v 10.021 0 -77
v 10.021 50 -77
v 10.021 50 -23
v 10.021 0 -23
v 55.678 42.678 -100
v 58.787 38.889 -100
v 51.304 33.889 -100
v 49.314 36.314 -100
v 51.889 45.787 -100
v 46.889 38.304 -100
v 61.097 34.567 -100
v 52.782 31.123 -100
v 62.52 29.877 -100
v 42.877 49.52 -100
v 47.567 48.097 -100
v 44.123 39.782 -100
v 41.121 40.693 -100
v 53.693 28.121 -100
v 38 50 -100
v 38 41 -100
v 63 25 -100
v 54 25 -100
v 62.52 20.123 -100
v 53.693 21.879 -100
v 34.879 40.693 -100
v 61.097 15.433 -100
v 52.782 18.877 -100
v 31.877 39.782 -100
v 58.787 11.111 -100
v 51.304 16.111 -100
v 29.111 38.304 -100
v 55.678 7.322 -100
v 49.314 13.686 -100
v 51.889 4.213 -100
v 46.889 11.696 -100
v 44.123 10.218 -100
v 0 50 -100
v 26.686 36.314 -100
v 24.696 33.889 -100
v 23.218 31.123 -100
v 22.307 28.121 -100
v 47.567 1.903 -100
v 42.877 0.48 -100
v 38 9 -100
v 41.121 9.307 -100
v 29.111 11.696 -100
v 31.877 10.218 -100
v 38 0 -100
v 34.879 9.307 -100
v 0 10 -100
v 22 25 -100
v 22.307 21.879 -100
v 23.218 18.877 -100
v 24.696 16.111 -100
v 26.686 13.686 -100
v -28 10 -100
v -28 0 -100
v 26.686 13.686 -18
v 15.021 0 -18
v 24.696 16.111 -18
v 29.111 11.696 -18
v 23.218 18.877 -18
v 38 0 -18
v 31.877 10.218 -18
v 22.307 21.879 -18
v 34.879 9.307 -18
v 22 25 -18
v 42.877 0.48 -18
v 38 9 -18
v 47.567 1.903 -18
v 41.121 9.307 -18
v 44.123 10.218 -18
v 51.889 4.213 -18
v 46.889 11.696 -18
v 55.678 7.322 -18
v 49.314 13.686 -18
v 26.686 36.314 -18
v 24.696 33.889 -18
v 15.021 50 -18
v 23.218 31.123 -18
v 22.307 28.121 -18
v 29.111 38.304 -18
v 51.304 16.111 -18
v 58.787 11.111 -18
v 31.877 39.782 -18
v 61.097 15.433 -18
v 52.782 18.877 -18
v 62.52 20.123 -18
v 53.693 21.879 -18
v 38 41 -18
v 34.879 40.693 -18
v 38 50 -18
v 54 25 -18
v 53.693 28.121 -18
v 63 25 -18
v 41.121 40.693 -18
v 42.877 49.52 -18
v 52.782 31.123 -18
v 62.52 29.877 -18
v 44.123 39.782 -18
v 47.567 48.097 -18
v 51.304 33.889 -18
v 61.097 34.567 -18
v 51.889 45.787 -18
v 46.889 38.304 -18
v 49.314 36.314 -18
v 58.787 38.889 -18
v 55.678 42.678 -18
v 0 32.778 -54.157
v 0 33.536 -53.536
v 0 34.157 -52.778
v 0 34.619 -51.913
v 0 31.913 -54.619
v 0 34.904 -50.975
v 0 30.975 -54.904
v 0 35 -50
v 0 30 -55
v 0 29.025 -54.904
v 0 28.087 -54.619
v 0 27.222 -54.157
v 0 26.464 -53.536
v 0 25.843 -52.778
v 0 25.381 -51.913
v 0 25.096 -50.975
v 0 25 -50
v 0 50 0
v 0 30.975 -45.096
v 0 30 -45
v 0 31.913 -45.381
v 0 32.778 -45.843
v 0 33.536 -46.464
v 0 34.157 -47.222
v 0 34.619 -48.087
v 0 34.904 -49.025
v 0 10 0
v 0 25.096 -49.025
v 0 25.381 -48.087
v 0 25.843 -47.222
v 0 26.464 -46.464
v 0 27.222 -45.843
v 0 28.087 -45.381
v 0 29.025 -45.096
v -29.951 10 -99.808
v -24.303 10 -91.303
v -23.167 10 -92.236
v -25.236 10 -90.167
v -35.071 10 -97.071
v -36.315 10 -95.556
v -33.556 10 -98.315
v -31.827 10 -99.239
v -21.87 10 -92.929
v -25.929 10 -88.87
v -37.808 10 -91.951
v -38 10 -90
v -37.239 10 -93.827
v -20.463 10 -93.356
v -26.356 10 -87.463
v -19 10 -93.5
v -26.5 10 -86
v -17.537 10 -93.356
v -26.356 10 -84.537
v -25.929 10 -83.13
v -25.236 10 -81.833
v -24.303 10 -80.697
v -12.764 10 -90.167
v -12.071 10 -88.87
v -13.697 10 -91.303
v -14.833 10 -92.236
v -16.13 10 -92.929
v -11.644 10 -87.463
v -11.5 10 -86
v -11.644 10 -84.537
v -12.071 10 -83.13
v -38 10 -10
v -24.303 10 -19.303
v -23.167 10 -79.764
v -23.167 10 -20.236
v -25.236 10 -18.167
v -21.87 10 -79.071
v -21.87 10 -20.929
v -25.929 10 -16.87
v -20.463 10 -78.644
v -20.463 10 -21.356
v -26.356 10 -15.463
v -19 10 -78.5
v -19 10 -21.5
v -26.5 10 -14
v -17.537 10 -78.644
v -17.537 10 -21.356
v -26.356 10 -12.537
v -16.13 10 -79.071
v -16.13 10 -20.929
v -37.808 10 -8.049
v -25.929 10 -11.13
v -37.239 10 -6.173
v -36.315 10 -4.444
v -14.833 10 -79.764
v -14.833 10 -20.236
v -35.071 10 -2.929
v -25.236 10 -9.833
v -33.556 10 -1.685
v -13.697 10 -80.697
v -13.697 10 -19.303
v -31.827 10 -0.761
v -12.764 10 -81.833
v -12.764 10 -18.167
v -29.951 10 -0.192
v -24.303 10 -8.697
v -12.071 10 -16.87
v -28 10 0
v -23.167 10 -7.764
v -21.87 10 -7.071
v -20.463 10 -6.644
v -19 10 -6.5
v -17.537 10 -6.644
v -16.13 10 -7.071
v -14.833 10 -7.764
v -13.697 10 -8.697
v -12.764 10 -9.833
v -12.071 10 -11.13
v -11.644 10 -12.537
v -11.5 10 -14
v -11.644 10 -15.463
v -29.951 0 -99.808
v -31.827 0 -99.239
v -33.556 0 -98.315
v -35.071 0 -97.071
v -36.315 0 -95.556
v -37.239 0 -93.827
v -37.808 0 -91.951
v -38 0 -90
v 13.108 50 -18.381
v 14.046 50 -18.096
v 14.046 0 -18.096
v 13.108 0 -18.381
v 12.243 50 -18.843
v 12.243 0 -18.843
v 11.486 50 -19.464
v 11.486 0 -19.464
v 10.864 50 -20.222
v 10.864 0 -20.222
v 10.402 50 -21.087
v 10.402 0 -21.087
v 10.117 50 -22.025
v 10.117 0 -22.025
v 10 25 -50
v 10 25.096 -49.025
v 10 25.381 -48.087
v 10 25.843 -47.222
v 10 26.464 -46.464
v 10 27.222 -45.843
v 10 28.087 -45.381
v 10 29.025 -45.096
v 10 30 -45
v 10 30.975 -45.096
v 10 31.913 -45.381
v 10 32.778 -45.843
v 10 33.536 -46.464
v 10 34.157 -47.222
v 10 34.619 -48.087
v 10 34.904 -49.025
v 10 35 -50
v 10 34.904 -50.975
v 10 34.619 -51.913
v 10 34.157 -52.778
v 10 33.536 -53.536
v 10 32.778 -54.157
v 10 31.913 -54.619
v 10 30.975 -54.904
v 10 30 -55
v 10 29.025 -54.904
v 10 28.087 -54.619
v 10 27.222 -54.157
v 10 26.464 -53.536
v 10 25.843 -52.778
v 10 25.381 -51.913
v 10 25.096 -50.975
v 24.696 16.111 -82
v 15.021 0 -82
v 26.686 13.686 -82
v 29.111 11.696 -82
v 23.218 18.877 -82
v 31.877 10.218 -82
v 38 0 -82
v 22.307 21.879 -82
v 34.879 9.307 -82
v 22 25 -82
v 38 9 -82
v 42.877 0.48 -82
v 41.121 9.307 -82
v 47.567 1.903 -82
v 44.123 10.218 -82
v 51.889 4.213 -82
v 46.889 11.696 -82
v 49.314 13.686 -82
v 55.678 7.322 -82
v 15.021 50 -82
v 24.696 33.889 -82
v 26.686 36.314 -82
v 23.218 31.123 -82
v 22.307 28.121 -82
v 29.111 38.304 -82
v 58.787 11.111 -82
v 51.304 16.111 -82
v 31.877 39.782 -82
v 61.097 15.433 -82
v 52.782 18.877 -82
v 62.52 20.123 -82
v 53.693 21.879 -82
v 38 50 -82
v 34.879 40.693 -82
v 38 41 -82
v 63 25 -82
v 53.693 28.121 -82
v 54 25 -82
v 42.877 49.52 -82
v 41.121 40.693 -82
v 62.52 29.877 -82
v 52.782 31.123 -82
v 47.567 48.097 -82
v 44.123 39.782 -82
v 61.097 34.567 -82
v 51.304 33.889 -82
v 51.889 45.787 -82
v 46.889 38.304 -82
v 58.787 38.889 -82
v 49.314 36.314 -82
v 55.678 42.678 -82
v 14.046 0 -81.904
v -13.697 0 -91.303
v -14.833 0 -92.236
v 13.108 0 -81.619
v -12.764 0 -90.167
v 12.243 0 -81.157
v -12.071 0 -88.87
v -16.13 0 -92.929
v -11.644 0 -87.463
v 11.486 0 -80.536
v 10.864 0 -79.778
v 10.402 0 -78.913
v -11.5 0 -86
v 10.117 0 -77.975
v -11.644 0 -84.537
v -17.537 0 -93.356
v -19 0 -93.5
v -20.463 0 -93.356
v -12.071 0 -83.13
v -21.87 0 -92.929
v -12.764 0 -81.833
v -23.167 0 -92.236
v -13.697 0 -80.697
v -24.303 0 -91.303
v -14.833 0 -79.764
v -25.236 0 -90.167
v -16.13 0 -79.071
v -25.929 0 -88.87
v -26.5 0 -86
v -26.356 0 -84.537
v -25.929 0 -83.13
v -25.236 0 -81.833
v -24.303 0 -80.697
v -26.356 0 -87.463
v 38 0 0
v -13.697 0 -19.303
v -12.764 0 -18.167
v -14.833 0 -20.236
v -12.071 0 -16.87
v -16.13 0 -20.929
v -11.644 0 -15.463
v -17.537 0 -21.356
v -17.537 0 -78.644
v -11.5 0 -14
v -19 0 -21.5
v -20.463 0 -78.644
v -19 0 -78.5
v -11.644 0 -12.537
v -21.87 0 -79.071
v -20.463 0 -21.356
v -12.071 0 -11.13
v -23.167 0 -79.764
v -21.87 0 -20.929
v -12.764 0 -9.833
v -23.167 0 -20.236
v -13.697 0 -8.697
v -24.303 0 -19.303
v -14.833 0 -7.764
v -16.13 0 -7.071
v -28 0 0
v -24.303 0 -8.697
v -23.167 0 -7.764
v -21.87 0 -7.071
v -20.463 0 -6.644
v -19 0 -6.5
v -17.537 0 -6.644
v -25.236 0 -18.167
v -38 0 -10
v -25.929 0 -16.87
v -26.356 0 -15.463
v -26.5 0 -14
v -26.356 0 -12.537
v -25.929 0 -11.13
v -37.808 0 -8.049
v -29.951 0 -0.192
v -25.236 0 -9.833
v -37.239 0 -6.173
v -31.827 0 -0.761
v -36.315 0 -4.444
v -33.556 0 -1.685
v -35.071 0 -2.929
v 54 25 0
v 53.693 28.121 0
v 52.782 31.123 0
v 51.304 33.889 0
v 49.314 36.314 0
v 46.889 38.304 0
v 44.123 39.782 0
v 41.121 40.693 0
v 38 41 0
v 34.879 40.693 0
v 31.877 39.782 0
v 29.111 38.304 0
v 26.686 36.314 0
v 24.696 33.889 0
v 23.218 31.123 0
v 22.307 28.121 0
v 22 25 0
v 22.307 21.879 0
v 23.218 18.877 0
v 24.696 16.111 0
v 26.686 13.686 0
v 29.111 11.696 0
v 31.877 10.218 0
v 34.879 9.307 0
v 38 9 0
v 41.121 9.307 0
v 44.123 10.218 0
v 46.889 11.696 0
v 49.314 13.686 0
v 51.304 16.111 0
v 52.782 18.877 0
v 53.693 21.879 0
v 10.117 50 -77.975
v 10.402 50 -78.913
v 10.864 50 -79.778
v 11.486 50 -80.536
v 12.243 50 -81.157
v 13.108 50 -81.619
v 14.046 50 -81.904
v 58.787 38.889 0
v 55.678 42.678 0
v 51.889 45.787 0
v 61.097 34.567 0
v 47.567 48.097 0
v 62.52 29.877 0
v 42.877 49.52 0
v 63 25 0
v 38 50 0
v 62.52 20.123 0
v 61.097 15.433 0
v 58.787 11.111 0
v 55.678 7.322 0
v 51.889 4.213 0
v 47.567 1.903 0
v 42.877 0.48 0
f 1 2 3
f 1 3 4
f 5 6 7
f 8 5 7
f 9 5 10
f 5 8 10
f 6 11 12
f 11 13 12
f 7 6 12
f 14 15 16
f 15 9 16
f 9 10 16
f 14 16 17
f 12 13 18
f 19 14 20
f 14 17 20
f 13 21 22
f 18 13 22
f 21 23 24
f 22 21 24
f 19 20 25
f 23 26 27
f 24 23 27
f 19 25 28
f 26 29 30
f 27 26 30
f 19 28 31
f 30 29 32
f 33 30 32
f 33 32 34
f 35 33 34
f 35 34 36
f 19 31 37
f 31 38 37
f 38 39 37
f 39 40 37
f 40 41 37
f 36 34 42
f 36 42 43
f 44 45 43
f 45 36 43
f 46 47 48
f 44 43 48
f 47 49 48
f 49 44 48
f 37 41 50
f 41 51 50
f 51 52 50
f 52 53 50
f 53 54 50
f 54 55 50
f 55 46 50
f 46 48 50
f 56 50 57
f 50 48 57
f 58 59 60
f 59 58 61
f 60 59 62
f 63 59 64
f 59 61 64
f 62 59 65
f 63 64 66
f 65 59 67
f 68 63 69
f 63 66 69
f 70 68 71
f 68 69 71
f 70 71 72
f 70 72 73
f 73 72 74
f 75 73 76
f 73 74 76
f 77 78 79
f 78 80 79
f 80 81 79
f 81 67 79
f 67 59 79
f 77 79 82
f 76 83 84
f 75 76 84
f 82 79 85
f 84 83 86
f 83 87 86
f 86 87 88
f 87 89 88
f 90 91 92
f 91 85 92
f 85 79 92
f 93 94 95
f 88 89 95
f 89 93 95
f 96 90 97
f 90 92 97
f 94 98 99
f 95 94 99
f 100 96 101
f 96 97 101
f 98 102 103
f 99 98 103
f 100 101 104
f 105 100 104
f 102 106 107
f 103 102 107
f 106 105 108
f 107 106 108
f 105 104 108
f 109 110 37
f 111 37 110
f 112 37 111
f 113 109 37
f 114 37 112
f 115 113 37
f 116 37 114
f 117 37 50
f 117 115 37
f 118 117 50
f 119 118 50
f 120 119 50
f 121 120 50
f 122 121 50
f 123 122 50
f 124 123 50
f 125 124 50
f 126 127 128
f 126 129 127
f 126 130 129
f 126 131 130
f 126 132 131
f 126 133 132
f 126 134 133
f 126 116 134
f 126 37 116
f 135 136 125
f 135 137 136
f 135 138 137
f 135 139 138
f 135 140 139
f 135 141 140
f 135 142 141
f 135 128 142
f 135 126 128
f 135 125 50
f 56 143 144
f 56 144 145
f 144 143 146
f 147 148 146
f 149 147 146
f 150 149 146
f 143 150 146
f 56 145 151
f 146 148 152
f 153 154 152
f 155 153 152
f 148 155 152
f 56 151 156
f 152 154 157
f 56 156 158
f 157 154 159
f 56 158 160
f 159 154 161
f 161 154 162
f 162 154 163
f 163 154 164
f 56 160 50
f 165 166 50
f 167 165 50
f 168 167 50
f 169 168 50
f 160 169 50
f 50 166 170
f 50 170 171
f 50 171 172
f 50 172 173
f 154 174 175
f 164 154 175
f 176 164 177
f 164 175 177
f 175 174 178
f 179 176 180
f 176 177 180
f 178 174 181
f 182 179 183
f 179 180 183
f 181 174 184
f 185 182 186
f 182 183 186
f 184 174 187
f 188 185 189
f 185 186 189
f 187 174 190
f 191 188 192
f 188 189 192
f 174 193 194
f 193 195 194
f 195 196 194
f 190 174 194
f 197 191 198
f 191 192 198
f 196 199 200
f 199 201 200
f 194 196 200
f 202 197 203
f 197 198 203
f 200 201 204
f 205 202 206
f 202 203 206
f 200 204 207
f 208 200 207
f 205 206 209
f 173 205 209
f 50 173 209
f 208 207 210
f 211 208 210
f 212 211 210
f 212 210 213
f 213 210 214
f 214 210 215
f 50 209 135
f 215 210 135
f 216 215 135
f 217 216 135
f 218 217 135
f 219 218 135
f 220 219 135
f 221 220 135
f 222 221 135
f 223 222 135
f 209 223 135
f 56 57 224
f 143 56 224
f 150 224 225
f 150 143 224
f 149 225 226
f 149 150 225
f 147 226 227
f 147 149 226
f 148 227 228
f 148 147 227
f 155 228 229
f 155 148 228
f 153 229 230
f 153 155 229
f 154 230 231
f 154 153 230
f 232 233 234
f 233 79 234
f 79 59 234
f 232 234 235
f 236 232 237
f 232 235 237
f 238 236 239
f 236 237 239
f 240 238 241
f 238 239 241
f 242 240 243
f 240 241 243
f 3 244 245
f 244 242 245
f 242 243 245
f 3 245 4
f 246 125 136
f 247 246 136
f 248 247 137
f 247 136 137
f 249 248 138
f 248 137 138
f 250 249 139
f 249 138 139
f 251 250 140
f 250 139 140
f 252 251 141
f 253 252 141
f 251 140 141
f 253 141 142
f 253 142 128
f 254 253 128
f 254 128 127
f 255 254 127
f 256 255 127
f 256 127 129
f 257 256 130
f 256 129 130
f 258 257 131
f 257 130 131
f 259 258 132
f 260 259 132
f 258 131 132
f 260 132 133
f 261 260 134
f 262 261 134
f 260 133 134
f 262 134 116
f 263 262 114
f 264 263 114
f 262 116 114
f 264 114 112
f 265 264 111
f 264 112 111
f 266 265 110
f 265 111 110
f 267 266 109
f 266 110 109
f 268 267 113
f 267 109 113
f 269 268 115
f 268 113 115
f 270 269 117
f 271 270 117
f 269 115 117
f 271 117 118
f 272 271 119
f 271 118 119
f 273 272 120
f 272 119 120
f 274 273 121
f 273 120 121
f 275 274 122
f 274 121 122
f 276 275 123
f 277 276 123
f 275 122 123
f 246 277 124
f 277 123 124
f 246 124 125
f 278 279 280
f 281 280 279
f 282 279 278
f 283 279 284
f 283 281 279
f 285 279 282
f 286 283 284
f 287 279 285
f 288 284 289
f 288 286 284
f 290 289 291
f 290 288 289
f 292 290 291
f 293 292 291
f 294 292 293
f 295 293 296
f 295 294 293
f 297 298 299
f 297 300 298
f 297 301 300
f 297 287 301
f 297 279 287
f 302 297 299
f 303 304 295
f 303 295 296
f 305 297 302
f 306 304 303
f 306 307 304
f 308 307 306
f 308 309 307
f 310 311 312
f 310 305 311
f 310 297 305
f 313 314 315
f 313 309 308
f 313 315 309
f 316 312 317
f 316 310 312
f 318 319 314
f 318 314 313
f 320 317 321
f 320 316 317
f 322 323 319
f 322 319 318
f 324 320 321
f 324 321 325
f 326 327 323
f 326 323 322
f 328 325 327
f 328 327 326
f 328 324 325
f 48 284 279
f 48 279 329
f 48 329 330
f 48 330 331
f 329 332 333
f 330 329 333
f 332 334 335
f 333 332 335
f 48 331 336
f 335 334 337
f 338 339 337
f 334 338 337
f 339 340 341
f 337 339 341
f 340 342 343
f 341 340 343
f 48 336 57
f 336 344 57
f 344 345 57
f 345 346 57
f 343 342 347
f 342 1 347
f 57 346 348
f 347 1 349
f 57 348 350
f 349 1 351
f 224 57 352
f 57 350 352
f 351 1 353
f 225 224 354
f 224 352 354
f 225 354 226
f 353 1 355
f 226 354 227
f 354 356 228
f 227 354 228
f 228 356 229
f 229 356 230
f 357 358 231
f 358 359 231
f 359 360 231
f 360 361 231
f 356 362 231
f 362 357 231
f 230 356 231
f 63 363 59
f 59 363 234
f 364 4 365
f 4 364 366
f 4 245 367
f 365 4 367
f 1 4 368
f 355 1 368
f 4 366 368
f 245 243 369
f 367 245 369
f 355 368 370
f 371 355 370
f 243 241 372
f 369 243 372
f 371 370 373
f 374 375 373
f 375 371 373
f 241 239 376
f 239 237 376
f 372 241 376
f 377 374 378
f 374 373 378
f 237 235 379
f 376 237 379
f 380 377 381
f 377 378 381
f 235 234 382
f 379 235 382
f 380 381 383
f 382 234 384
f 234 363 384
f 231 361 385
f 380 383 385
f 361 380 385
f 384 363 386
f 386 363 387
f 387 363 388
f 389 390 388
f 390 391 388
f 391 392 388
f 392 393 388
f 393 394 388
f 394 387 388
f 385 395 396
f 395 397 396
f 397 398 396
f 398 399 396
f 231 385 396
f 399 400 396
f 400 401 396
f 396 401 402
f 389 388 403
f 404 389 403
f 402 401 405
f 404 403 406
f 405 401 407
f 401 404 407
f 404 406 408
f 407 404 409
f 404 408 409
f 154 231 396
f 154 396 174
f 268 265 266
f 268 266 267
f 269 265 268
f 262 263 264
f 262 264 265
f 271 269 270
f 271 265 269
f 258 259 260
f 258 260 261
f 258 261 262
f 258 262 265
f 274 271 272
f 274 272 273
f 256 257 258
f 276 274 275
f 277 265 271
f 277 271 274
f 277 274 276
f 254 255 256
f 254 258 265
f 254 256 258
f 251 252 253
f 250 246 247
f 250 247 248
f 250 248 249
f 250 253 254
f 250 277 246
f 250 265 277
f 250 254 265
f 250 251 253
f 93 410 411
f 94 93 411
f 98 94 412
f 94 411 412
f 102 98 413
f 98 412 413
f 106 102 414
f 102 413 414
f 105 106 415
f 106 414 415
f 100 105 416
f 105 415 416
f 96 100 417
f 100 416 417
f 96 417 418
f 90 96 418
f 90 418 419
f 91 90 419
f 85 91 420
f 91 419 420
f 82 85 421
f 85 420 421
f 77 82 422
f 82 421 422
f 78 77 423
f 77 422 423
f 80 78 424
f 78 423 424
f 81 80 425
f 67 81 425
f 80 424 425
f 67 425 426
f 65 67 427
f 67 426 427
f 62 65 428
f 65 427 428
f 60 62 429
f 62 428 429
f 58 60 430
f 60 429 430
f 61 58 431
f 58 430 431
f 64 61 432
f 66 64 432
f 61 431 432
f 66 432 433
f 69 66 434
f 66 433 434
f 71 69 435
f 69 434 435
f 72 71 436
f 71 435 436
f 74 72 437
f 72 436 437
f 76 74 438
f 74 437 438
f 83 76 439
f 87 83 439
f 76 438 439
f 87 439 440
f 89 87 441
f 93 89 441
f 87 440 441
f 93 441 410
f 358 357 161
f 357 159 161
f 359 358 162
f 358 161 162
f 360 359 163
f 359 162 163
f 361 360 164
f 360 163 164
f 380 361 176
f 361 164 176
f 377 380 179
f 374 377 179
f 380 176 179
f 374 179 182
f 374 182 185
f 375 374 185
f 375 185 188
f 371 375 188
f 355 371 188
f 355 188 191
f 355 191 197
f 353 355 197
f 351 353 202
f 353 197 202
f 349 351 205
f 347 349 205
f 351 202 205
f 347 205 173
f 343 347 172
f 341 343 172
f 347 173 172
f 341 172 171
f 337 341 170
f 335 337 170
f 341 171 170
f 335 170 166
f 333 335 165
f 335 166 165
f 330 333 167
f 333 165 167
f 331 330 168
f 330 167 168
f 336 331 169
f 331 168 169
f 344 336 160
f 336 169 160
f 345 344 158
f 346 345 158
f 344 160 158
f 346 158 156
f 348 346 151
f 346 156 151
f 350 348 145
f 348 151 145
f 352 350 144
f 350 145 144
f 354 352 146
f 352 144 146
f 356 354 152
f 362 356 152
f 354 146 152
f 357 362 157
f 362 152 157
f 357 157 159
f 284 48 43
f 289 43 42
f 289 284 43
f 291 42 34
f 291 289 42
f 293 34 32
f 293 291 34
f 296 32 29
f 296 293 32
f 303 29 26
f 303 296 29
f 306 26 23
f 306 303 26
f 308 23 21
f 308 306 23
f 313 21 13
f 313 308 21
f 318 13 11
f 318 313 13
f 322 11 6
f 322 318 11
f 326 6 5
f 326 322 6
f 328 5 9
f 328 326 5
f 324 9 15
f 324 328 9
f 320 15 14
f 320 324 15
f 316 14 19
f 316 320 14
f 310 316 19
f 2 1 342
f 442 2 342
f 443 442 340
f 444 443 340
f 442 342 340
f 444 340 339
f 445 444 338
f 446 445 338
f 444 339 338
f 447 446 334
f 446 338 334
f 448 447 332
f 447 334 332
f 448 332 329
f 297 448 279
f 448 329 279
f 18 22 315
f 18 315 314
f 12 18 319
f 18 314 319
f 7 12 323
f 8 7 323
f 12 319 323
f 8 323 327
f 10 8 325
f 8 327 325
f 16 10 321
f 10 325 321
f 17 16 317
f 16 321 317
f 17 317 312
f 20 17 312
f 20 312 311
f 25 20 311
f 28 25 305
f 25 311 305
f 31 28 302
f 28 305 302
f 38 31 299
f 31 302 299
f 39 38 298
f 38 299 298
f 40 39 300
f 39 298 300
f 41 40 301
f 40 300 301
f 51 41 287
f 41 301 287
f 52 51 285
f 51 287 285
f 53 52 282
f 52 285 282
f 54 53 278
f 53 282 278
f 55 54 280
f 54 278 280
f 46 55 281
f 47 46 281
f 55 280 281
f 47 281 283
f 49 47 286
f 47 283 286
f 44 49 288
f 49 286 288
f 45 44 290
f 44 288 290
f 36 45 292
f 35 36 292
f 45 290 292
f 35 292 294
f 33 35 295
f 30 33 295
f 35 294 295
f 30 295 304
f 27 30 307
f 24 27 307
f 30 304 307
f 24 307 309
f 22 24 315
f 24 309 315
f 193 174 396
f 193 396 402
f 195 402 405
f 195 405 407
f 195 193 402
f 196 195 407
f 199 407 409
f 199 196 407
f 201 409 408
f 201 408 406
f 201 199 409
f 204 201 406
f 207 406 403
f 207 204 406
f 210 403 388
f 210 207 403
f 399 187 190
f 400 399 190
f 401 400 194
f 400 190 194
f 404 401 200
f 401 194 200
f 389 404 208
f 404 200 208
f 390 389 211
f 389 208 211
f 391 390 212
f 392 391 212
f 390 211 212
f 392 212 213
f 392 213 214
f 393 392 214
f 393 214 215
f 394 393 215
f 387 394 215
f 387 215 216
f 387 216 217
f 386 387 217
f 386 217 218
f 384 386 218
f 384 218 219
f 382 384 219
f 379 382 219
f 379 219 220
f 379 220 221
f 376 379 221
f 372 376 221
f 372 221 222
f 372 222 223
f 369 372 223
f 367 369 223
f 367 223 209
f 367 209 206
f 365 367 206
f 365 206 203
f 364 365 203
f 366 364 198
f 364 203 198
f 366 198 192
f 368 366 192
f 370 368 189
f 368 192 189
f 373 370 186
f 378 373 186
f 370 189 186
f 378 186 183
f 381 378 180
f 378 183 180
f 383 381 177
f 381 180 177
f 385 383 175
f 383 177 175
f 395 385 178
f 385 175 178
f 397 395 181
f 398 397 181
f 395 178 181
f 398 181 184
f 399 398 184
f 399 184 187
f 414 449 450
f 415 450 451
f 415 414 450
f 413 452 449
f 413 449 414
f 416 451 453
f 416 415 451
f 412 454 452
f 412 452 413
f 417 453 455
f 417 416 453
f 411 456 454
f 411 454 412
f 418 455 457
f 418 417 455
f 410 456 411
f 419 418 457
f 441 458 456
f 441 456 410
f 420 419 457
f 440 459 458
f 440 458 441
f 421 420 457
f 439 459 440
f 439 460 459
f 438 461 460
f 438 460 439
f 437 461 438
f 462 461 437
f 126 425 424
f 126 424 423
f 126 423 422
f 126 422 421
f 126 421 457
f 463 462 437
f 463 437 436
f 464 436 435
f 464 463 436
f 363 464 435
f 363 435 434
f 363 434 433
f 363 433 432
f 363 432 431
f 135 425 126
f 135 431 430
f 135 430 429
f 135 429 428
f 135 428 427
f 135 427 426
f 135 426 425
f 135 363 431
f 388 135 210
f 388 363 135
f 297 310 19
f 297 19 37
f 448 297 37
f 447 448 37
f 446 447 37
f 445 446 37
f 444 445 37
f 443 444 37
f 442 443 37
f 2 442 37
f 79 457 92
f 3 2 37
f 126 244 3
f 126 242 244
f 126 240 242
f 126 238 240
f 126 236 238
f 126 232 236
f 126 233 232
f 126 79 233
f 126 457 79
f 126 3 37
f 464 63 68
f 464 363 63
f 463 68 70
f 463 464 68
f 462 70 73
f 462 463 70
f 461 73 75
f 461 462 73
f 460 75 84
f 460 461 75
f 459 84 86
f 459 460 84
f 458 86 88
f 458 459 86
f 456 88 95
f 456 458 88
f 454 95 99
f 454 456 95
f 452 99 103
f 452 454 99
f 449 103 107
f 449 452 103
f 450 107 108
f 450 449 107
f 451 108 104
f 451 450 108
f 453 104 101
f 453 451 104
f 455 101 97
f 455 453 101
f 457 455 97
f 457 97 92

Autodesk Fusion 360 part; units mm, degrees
sketch "Sketch1" plane through (0, 0, 0) normal (0, 0, 1) x (1, 0, 0)
  line L0 (0, 0) -> (38, 0)
  line L1 (38, 0) -> (38, 50)
  line L2 (38, 50) -> (0, 50)
  line L3 (0, 50) -> (0, 0)
  circle A0 centre (38, 25) radius 25
  circle A1 centre (38, 25) radius 16
  dimension "d1" = 38
  dimension "d2" = 50
  dimension "d3" = 50
  dimension "d5" = 32
extrude "Extrude1" add sketch "Sketch1" against normal blind 100 contours L0 L2 L3 A0 | L1 A0 A1 | L1 A0 A1
sketch "Sketch2" plane through (0, 0, 0) normal (0, -1, 0) x (1, 0, 0)
  line L0 (38, 0) -> (0, 0)
  line L1 (0, 0) -> (0, -100) construction
  line L2 (0, -100) -> (38, -100)
  line L3 (38, -100) -> (38, 0)
  line L4 (0, -50) -> (10, -50) construction
  line L5 (10, -50) -> (10, -18)
  line L6 (10, -50) -> (10, -82)
  dimension "d8" = 32
  dimension "d9" = 32
sketch "Sketch3" plane through (0, 0, 0) normal (0, -1, 0) x (1, 0, 0)
  line L0 (38, 0) -> (0, 0)
  line L1 (0, 0) -> (0, -100)
  line L2 (0, -100) -> (38, -100)
  line L3 (38, -100) -> (38, 0)
ref_plane "WorkPlane1" through (31.5, 25, -50) normal (0, 0, -1) x (-1, 0, 0)
sketch "Sketch4" plane through (31.5, 25, -50) normal (0, 0, -1) x (1, 0, 0)
sketch "Sketch5" plane through (0, 0, 0) normal (0, 0, 1) x (-1, 0, 0)
  circle A0 centre (-38, -25) radius 16
  arc A1 (-38, 0) -> (-38, -50) centre (-38, -25) ccw
  line L0 (-38, -50) -> (0, -50)
  line L1 (0, -50) -> (0, 0)
  line L2 (0, 0) -> (-38, 0)
  line L3 (0, 0) -> (38, 0)
  line L4 (38, 0) -> (38, -10)
  line L5 (38, -10) -> (0, -10)
  line L6 (0, -10) -> (0, 0)
  dimension "d10" = 38
  dimension "d11" = 10
extrude "Extrude2" add sketch "Sketch5" against normal blind 100 contours L1 L3 L4 L5 L6
sketch "Sketch6" plane through (0, 10, 0) normal (0, 1, 0) x (-1, 0, 0)
  line L0 (38, 0) -> (0, 0)
  line L1 (0, 0) -> (0, -100)
  line L2 (0, -100) -> (38, -100)
  line L3 (38, -100) -> (38, 0)
  line L4 (19, 0) -> (19, -86) construction
  circle A0 centre (19, -86) radius 7.5
  line L5 (19, 0) -> (33, 0) construction
  line L6 (33, 0) -> (33, -14) construction
  line L7 (33, -14) -> (19, -14) construction
  circle A1 centre (19, -14) radius 7.5
  dimension "d14" = 86
  dimension "d15" = 15
  dimension "d16" = 14
  dimension "d17" = 14
  dimension "d18" = 15
extrude "Extrude3" cut sketch "Sketch6" against normal blind 10 contours A0 | A1
fillet "Fillet1" radius 10 1 edges at (-38, 5, 0)
fillet "Fillet2" radius 10 1 edges at (-38, 5, -100)
ref_plane "WorkPlane2" through (17.5, 25, -50) normal (0, 0, 1) x (1, 0, 0)
sketch "Sketch7" plane through (17.5, 25, -50) normal (0, 0, 1) x (1, 0, 0)
  line L0 (-17.4789, 13.5699) -> (-7.4789, 13.5699) construction
  line L1 (-7.4789, 25.0534) -> (-7.4789, -25)
  line L2 (-7.4789, 25.0534) -> (50, 25.0534)
  line L3 (50, 25.0534) -> (50, -25)
  line L4 (50, -25) -> (-7.4789, -25)
  dimension "d25" = 10
extrude "Extrude4" cut sketch "Sketch7" along normal mid plane 64
sketch "Sketch8" plane through (0, 0, 0) normal (-1, 0, 0) x (0, -1, 0)
  line L0 (-10, -100) -> (-10, 0)
  line L1 (-10, 0) -> (-50, 0)
  line L2 (-50, 0) -> (-50, -100)
  line L3 (-50, -100) -> (-10, -100)
  line L4 (-50, -50) -> (-10, -50) construction
  circle A0 centre (-30, -50) radius 5
  dimension "d28" = 10
fillet "Fillet3" radius 5 1 edges at (10.0211, 25, -18)
fillet "Fillet4" radius 5 1 edges at (10.0211, 25, -82)
extrude "Extrude5" cut sketch "Sketch8" against normal blind 10 contours A0
